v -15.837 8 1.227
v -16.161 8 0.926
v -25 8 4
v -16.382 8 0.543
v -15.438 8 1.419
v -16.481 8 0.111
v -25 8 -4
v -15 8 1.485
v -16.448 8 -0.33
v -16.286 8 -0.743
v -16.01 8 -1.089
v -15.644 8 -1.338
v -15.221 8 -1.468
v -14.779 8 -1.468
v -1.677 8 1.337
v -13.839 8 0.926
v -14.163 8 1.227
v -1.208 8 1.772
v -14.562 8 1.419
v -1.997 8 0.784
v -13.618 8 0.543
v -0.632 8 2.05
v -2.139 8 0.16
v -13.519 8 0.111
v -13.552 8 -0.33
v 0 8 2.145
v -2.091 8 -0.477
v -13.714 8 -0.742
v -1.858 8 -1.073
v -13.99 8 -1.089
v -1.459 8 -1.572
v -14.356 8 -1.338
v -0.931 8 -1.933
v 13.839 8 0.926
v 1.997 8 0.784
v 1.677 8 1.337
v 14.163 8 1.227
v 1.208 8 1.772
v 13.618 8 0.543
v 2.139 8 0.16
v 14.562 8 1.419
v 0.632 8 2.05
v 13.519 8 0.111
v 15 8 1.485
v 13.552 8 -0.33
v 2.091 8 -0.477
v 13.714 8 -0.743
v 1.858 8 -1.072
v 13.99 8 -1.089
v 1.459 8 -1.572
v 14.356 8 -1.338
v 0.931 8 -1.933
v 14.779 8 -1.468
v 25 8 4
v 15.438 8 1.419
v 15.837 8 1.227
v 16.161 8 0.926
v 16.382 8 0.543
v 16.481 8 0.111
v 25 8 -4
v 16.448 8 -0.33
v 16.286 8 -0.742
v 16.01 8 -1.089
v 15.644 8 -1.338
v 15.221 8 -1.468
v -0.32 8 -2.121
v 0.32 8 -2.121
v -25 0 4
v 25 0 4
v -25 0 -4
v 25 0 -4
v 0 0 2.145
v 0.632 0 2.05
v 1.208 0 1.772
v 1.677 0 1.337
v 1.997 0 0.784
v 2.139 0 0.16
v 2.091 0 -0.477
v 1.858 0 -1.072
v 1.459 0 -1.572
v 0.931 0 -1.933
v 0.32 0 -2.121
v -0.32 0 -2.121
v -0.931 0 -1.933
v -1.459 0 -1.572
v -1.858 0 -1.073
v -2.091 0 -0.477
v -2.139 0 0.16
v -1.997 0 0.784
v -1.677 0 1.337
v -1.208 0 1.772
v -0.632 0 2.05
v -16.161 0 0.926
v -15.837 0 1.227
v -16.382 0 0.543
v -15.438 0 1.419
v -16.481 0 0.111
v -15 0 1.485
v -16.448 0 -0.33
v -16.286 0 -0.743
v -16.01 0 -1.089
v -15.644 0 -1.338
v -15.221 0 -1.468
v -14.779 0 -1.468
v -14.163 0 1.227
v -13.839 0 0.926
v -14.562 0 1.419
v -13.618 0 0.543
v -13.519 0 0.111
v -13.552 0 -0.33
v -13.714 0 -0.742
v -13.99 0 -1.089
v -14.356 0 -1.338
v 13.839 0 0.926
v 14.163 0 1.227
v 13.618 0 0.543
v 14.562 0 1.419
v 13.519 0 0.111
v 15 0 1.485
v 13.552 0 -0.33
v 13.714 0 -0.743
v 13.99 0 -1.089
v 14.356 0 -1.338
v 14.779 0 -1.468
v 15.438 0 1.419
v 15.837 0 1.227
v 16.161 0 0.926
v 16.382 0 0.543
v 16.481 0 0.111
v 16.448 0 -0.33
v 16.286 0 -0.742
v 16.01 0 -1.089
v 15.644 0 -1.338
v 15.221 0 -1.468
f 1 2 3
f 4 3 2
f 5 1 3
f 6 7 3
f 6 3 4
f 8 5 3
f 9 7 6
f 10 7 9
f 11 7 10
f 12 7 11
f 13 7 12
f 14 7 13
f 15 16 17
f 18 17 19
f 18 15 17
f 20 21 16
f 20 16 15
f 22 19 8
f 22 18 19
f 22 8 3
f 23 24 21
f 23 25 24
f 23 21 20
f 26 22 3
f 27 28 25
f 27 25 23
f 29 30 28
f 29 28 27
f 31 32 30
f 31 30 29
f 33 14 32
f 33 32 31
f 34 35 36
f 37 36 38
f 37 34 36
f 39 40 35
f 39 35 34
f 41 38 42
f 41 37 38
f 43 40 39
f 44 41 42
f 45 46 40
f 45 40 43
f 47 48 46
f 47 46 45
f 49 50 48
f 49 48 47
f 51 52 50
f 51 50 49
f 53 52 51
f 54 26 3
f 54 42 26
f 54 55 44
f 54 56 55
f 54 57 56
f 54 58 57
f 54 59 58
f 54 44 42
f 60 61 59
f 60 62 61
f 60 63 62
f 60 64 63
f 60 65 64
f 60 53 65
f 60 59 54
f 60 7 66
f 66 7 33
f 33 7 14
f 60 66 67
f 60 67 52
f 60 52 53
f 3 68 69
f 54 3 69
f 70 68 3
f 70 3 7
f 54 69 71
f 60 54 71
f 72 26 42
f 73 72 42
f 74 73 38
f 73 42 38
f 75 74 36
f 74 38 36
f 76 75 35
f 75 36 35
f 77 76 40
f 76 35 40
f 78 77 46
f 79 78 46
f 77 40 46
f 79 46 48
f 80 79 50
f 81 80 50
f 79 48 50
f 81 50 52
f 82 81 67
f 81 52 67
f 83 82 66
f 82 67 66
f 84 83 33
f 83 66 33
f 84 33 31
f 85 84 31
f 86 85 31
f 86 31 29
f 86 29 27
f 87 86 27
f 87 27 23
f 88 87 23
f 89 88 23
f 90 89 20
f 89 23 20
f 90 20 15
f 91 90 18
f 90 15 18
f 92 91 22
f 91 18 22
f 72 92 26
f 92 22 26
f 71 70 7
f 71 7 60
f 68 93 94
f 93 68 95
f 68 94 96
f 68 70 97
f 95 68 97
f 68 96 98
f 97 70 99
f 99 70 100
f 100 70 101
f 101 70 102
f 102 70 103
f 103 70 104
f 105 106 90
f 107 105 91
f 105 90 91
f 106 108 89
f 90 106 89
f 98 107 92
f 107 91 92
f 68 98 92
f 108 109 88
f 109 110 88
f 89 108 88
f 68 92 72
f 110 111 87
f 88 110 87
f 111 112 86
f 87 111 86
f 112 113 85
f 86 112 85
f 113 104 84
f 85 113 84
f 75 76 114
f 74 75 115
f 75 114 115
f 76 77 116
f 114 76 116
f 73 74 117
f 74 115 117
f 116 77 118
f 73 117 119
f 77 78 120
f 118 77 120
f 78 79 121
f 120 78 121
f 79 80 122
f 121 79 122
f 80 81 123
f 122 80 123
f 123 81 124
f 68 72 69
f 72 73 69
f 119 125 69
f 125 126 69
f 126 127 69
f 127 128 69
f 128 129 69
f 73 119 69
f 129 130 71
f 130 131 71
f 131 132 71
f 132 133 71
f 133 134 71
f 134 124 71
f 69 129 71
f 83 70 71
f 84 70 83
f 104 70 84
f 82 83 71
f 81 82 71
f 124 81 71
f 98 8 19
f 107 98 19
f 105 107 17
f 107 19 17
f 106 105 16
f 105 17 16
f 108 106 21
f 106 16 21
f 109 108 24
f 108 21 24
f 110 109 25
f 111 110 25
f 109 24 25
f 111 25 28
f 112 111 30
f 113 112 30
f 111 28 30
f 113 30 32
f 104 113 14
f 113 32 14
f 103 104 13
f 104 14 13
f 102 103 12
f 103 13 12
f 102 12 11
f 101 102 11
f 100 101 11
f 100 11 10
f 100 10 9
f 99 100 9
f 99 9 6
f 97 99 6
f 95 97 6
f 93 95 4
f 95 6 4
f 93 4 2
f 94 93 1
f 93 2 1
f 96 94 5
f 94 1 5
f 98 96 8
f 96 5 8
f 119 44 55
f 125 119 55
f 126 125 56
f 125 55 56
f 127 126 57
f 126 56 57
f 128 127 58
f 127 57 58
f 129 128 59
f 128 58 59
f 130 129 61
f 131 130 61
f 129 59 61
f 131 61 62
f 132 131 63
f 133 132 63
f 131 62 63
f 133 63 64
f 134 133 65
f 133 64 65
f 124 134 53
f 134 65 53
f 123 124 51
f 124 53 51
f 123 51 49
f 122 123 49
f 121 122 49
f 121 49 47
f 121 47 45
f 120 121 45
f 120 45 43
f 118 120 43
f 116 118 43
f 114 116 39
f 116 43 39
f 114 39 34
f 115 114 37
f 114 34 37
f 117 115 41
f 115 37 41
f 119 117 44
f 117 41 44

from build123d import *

# Parameters (mm, degrees)
SKETCH1_W           = 50
SKETCH1_H           = 8
BOSS_EXTRUDE1_DEPTH = 8
SKETCH2_R           = 2.145
SKETCH2_R_2         = 1.485
CUT_EXTRUDE1_DEPTH  = 8


with BuildPart() as part:
    # Sketch1 → Boss-Extrude1 (new body)
    with BuildSketch(Plane(origin=(0, 0, 0), x_dir=(1, 0, 0), z_dir=(0, 1, 0))):
        Rectangle(SKETCH1_W, SKETCH1_H)
    extrude(amount=BOSS_EXTRUDE1_DEPTH)

    # Sketch2 → Cut-Extrude1 (cut)
    with BuildSketch(Plane(origin=(0, 8, 0), x_dir=(1, 0, 0), z_dir=(0, 1, 0))):
        with Locations(Location((0, 0, 0), (0, 0, 270))):
            Circle(SKETCH2_R)
        with Locations(Location((-15, 0, 0), (0, 0, 270))):
            Circle(SKETCH2_R_2)
        with Locations(Location((15, 0, 0), (0, 0, 270))):
            Circle(SKETCH2_R_2)
    extrude(amount=-CUT_EXTRUDE1_DEPTH, mode=Mode.SUBTRACT)


solid = part.part
